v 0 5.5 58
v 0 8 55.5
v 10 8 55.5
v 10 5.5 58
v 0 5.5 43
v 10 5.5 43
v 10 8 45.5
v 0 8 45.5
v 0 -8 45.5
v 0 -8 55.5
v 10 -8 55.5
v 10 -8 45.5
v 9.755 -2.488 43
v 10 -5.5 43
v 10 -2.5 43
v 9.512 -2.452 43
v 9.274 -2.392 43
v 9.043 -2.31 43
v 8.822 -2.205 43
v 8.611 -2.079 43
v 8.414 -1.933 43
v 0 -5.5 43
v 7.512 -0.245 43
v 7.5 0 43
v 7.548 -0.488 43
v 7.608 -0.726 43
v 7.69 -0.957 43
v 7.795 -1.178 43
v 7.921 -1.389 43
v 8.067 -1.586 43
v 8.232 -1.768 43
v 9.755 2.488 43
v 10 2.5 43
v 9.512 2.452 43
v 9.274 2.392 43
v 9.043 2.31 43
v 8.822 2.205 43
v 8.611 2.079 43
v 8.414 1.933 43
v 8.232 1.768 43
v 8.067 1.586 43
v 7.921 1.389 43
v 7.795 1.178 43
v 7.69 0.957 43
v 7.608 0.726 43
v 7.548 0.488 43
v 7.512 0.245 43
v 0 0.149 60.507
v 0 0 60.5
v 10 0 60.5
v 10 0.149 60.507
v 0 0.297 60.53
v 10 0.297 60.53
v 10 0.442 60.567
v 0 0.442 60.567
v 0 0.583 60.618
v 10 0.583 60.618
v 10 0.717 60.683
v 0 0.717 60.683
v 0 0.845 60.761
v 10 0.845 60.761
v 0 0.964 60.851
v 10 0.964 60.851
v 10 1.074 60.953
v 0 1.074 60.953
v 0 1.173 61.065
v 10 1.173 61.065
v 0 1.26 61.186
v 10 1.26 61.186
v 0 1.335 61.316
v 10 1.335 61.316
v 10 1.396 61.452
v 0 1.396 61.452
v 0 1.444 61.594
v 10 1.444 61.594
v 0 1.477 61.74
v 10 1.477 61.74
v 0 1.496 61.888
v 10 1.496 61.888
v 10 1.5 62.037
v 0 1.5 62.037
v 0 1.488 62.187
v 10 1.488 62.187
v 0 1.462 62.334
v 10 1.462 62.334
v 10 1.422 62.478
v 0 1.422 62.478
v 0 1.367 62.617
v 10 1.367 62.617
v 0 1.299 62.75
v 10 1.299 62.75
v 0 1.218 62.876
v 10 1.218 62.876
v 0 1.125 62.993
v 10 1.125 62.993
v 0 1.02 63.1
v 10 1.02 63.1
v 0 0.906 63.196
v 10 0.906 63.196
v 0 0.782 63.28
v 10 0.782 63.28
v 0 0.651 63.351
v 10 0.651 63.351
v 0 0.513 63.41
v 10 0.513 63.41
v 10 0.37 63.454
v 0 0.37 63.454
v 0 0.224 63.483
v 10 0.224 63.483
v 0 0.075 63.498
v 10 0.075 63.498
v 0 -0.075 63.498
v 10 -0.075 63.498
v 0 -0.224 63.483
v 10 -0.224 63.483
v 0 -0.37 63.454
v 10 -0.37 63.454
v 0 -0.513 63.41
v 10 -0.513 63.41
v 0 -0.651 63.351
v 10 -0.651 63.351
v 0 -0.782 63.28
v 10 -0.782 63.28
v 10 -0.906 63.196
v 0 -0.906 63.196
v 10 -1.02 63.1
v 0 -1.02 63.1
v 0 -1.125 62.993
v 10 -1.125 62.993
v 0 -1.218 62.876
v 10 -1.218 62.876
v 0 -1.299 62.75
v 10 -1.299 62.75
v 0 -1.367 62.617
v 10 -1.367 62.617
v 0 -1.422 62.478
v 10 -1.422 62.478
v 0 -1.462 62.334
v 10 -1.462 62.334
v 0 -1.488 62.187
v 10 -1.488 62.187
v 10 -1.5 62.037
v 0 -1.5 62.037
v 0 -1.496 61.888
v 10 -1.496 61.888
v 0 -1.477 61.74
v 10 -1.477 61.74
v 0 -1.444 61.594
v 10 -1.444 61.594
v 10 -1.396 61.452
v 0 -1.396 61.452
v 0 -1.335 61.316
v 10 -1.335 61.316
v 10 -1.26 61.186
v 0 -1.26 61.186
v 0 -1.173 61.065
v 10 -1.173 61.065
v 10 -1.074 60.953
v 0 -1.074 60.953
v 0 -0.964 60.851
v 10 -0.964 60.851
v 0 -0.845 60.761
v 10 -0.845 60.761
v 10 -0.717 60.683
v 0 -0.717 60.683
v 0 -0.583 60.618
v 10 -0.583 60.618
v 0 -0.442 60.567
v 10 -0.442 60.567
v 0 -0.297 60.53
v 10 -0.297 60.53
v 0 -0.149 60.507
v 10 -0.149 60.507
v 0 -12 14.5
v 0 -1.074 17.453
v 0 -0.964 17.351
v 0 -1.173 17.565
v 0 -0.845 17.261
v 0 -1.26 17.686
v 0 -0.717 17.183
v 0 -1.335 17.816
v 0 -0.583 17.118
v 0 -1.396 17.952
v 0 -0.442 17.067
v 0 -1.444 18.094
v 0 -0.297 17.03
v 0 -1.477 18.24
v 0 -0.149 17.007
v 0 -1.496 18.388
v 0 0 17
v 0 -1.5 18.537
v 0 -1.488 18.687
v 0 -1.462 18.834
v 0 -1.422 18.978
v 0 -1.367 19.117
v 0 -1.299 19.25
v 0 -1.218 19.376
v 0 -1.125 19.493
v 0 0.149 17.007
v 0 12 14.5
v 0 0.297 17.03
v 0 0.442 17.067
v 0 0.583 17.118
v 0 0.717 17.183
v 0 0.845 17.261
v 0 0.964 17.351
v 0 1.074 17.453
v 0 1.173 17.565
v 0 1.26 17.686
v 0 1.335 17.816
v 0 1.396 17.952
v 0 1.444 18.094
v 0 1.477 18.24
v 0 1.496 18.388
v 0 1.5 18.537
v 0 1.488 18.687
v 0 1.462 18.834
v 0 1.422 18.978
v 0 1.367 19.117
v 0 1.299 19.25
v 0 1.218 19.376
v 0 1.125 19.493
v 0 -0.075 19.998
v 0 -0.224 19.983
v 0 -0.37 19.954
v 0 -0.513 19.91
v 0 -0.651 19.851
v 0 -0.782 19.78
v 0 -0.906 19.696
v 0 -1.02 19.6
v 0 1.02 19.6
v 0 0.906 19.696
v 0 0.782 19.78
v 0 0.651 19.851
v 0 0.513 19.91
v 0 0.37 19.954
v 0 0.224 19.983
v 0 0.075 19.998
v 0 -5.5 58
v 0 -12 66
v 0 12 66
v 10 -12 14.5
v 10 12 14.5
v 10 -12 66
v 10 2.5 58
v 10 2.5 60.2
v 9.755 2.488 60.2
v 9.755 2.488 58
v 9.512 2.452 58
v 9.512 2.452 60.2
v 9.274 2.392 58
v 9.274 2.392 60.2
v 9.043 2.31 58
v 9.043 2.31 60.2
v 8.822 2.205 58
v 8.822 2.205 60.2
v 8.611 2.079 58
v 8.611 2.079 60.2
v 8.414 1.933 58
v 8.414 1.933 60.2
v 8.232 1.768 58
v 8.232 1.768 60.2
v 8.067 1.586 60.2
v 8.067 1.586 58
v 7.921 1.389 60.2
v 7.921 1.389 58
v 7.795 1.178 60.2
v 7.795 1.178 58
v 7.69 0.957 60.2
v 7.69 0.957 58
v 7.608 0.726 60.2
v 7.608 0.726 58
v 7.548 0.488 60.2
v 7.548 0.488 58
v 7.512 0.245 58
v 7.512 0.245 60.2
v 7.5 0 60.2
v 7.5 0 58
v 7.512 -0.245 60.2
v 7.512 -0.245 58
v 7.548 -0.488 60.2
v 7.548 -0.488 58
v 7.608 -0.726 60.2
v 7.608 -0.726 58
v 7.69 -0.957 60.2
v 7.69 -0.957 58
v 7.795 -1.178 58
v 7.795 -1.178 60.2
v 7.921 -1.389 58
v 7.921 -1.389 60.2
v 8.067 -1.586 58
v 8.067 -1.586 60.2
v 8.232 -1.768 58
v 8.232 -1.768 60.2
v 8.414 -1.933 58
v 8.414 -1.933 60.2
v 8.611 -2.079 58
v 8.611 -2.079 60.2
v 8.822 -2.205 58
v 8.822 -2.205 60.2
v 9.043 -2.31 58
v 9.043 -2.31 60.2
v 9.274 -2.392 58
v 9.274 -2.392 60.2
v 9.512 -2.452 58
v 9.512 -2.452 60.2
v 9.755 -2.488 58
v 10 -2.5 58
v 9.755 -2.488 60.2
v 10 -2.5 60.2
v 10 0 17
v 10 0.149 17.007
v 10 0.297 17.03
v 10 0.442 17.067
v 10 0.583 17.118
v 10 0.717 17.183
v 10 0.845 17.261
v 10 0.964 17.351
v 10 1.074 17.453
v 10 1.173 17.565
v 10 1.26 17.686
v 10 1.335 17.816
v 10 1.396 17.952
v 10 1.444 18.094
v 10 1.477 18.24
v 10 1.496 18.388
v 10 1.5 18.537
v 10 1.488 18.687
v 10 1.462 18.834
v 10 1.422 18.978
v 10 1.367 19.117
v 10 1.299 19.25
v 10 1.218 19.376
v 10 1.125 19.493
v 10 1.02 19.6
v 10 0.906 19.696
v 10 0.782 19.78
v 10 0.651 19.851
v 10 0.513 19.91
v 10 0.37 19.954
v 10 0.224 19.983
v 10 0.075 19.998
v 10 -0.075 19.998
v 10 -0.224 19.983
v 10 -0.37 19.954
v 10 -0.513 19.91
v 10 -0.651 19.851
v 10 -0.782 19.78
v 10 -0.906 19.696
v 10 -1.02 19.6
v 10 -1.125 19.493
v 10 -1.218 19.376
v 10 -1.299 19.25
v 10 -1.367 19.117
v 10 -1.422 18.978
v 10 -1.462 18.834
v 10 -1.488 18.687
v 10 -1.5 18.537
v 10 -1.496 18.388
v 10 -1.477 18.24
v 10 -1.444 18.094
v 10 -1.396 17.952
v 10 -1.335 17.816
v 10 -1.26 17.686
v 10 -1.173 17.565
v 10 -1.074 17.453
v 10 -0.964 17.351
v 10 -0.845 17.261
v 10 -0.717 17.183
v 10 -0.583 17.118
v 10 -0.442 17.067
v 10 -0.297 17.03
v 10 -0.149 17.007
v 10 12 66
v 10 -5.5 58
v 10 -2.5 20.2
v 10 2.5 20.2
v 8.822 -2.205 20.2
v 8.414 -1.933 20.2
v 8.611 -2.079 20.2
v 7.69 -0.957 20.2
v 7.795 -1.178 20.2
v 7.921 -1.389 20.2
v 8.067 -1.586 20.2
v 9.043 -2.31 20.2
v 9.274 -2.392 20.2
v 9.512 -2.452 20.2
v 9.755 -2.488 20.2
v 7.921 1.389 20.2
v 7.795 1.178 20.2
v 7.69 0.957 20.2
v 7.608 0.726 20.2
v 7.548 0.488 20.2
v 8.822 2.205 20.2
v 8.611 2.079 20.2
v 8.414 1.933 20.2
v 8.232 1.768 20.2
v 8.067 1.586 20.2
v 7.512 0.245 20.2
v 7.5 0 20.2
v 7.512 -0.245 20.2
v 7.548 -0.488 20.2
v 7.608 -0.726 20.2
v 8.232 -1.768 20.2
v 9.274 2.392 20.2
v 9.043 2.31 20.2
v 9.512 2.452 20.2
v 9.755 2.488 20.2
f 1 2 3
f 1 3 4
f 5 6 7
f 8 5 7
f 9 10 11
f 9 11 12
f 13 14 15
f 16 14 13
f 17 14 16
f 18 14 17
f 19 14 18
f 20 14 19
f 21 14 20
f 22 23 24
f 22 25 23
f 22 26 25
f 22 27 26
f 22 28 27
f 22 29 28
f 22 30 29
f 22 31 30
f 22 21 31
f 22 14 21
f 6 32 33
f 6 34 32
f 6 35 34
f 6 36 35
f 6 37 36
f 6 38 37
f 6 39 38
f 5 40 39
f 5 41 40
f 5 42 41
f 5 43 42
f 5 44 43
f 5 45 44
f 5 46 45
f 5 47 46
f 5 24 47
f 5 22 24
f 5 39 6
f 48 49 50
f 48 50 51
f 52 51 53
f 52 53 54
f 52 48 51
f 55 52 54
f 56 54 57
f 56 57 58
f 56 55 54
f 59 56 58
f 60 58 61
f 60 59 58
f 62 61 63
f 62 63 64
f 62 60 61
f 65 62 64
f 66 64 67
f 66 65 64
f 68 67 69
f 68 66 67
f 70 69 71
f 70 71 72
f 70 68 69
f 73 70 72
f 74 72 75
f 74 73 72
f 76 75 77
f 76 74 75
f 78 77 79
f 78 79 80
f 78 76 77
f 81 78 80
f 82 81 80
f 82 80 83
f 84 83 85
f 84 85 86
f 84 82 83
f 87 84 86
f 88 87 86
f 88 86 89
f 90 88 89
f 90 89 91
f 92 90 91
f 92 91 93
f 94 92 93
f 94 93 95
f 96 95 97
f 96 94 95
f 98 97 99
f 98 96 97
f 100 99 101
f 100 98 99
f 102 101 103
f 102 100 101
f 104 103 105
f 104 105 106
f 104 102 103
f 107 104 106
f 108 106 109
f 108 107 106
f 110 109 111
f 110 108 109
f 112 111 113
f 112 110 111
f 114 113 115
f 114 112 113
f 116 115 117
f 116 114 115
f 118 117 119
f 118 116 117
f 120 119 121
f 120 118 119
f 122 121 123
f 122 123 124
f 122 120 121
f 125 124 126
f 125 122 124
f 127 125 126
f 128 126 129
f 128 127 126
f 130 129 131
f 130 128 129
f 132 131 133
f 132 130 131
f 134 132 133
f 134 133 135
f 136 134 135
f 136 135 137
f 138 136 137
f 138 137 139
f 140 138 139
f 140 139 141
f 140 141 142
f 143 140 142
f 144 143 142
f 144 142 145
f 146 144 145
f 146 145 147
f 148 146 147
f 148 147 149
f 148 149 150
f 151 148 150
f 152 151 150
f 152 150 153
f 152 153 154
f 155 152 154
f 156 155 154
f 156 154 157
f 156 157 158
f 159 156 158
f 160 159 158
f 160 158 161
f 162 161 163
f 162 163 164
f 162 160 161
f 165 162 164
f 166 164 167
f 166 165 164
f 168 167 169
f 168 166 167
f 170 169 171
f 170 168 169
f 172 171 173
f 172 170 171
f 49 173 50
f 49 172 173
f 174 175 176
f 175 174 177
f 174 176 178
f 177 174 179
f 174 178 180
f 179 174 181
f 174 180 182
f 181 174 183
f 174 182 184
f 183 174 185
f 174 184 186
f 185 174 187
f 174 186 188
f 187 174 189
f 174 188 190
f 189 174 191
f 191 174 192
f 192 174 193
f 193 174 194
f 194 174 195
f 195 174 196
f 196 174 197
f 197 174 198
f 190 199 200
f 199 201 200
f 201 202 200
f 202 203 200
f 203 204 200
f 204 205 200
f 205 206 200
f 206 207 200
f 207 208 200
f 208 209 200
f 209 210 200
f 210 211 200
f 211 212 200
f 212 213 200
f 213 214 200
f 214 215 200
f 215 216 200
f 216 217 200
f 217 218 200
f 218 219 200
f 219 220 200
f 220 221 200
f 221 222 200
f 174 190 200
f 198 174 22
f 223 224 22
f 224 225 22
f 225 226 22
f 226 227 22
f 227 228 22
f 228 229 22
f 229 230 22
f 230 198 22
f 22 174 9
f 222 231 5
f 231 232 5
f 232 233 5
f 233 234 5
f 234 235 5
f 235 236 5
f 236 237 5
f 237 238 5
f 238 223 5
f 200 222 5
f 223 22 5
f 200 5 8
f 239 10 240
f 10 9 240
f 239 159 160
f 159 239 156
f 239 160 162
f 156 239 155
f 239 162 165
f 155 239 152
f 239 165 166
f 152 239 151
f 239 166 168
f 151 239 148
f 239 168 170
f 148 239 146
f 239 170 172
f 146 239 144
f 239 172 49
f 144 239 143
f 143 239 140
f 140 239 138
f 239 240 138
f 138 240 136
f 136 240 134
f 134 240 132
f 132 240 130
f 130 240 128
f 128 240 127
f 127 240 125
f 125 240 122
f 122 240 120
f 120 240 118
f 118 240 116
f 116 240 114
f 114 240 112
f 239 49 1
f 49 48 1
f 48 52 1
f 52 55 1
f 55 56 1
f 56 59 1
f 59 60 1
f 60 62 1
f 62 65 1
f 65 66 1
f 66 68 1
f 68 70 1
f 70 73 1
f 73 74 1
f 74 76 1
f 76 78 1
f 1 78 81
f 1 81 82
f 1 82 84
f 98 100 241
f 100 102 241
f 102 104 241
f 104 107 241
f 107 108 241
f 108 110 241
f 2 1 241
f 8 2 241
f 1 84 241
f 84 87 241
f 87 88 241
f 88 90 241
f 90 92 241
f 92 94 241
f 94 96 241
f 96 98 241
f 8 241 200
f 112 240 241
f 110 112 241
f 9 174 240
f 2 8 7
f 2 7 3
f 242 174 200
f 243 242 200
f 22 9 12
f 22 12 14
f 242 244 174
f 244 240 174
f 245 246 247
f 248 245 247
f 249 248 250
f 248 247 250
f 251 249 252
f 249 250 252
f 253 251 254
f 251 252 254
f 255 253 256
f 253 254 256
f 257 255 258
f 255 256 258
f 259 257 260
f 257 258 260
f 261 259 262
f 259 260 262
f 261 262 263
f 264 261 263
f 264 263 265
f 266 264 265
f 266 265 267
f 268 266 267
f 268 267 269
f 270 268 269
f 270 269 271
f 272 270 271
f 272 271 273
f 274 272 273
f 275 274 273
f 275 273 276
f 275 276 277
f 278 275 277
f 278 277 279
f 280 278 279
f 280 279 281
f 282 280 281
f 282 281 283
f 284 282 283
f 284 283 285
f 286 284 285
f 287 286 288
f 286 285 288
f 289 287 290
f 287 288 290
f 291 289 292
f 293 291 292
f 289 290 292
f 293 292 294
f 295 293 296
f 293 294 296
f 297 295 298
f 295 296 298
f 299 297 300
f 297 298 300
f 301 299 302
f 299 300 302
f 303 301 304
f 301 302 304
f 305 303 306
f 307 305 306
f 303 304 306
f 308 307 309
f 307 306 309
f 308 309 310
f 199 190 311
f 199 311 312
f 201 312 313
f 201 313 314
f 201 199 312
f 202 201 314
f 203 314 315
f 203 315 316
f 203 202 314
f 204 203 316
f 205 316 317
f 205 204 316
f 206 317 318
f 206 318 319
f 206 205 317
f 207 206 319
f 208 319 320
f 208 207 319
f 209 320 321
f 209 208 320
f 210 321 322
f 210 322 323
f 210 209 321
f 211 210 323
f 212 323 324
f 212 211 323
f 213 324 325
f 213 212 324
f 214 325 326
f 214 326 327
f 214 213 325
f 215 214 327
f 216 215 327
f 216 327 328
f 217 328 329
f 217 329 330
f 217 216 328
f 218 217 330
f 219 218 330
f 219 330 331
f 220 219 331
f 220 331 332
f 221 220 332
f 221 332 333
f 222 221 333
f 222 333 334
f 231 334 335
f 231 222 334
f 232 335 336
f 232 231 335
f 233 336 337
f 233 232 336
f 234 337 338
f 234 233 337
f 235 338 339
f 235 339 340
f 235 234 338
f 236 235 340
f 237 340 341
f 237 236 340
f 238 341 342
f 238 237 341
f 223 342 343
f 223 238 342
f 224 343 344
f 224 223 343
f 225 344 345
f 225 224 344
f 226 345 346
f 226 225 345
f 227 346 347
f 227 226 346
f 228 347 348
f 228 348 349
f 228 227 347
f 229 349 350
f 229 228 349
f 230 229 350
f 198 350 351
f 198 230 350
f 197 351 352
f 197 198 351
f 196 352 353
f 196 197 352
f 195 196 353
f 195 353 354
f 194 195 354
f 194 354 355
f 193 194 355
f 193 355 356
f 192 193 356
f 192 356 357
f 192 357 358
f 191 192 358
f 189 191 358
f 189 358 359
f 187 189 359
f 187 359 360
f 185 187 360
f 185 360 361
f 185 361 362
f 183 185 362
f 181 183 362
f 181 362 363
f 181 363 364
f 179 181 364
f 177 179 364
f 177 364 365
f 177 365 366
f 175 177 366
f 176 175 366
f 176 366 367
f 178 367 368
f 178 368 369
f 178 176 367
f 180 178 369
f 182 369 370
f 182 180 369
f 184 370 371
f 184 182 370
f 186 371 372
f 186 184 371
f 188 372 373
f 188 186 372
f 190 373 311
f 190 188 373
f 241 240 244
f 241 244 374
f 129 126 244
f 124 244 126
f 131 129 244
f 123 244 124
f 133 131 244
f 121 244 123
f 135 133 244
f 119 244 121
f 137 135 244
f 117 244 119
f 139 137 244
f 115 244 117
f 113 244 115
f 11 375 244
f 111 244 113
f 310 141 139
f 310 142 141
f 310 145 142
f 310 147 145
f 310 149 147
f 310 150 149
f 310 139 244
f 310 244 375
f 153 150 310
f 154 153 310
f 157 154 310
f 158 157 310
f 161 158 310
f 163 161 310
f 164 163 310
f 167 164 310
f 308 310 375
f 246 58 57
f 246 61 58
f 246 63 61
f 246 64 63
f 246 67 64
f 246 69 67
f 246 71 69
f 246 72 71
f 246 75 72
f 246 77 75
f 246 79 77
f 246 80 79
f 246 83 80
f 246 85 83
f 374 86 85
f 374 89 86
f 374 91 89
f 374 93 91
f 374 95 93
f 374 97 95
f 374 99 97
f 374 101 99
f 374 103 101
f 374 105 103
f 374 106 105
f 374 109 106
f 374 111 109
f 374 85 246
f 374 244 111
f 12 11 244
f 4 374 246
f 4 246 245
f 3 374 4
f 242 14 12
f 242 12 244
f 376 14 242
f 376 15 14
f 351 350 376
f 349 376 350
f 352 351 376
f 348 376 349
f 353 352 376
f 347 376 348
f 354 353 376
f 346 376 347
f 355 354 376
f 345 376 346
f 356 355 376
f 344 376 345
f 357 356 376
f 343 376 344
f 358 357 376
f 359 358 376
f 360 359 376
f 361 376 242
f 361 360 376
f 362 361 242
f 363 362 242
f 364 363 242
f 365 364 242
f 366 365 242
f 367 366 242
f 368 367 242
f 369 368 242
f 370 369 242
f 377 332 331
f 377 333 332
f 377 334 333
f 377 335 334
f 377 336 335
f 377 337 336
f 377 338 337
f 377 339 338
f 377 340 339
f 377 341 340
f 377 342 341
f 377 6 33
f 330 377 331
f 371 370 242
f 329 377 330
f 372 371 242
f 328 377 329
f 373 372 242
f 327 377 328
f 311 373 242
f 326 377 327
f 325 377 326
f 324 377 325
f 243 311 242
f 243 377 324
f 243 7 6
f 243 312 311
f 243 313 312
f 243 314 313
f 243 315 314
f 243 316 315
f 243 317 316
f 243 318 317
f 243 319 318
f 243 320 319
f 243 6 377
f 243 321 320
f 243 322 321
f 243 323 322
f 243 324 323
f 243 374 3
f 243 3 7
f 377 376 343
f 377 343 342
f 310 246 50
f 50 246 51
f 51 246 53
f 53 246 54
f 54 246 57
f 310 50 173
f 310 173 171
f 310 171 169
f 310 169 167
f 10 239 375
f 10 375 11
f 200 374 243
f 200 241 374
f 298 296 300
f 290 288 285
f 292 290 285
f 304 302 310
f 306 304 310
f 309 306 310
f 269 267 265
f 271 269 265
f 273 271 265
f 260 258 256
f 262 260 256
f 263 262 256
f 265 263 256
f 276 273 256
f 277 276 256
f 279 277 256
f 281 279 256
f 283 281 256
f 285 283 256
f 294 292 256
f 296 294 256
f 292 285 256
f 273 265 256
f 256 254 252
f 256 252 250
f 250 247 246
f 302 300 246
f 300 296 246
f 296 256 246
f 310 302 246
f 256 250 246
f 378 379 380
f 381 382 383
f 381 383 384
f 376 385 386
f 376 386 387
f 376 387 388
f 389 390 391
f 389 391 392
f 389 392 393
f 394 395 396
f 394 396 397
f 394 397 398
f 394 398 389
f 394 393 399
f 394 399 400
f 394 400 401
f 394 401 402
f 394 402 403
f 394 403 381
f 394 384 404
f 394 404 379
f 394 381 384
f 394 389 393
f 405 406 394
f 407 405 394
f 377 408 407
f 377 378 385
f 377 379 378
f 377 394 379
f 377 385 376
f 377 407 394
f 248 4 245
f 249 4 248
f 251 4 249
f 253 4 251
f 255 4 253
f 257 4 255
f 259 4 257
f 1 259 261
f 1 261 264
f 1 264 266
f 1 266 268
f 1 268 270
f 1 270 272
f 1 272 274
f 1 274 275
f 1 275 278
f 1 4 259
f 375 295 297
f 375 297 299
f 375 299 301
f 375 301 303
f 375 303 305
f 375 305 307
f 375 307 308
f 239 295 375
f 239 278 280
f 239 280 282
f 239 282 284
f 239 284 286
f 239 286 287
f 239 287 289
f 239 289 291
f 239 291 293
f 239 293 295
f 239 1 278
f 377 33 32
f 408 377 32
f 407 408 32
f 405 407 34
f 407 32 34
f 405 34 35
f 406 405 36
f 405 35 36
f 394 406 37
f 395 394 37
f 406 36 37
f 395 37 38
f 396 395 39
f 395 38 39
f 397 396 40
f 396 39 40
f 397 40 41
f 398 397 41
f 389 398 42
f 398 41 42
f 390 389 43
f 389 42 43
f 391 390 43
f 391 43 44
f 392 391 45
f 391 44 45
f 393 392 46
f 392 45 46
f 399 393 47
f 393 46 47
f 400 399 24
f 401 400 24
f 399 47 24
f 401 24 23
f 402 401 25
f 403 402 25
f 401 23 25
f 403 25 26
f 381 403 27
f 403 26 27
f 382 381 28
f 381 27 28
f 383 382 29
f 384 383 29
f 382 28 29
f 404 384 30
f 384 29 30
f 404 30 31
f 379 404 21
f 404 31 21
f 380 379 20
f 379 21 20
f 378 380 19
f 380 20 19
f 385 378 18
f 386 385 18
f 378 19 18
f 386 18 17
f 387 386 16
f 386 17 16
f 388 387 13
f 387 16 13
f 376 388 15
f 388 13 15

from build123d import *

# Parameters (mm, degrees)
SKETCH_1_W          = 42
SKETCH_1_H          = 42
EXTRUDE_1_DEPTH     = 40
CHAMFER_1_SIZE      = 5
SKETCH_4_R          = 1.75
CUT_EXTRUDE_1_DEPTH = 3
SKETCH_5_W          = 26
SKETCH_5_H          = 24
SKETCH_5_W_2        = 15
SKETCH_5_H_2        = 16
EXTRUDE_2_DEPTH     = 21
SKETCH_7_W          = 40
SKETCH_7_H          = 24
CUT_EXTRUDE_3_DEPTH = 21
SKETCH_6_R          = 3
CUT_EXTRUDE_2_DEPTH = 10
CHAMFER_2_SIZE      = 2.5
SKETCH_8_W          = 51.5
SKETCH_8_H          = 24
SKETCH_8_R          = 1.5
EXTRUDE_3_DEPTH     = 10
CUT_EXTRUDE_5_DEPTH = 73.374028491
CUT_EXTRUDE_START   = -5.8
SKETCH_10_R         = 2.5
CUT_EXTRUDE_6_DEPTH = 40


with BuildPart() as part:
    # 草圖1 → 填料-伸長1 (new body)
    with BuildSketch(Plane.XY):
        Rectangle(SKETCH_1_W, SKETCH_1_H)
    extrude(amount=EXTRUDE_1_DEPTH)

    # 導角1
    chamfer_1_edges = [part.edges().sort_by_distance(p)[0] for p in [
        (-21, 21, 20),
        (21, 21, 20),
        (21, -21, 20),
        (-21, -21, 20),
    ]]
    chamfer(chamfer_1_edges, length=CHAMFER_1_SIZE)

    # 草圖4 → 除料-伸長1 (cut)
    with BuildSketch(Plane.XY.offset(40)):
        with Locations((-15.5, 15.5)):
            Circle(SKETCH_4_R)
        with Locations(Location((-15.5, -15.5, 0), (0, 0, 180))):
            Circle(SKETCH_4_R)
        with Locations((15.5, -15.5)):
            Circle(SKETCH_4_R)
        with Locations(Location((15.5, 15.5, 0), (0, 0, 180))):
            Circle(SKETCH_4_R)
    extrude(amount=-CUT_EXTRUDE_1_DEPTH, mode=Mode.SUBTRACT)

    # 草圖7 → 除料-伸長3 (cut)
    with BuildSketch(Plane(origin=(21, 0, 0), x_dir=(0, 0, -1), z_dir=(1, 0, 0))):
        with Locations((-20, 0)):
            Rectangle(SKETCH_7_W, SKETCH_7_H)
    extrude(amount=-CUT_EXTRUDE_3_DEPTH, mode=Mode.SUBTRACT)


with BuildPart() as body_2:
    # 草圖5 → 填料-伸長2 (new body)
    with BuildSketch(Plane.ZY.offset(21)):
        with Locations((53, 0)):
            Rectangle(SKETCH_5_W, SKETCH_5_H)
        with Locations((50.5, 0)):
            Rectangle(SKETCH_5_W_2, SKETCH_5_H_2, mode=Mode.SUBTRACT)
    extrude(amount=-EXTRUDE_2_DEPTH)


with BuildPart() as cut_extrude_2_tool:
    # 草圖6 → 除料-伸長2 (new body)
    with BuildSketch(Plane(origin=(0, 0, 0), x_dir=(0, 0, -1), z_dir=(1, 0, 0))):
        with Locations((-62, 0)):
            Circle(SKETCH_6_R)
        with Locations((-18.5, 0)):
            Circle(SKETCH_6_R)
    extrude(amount=-CUT_EXTRUDE_2_DEPTH)


with BuildPart() as part_1:
    add(part.part)

    # 除料-伸長2: cut by cut_extrude_2_tool
    add(cut_extrude_2_tool.part, mode=Mode.SUBTRACT)



with BuildPart() as body_2_1:
    add(body_2.part)

    # 除料-伸長2: cut by cut_extrude_2_tool
    add(cut_extrude_2_tool.part, mode=Mode.SUBTRACT)

    # 導角2
    chamfer_2_edges = [body_2_1.edges().sort_by_distance(p)[0] for p in [
        (-10.5, -8, 43),
        (-10.5, 8, 43),
        (-10.5, 8, 58),
        (-10.5, -8, 58),
    ]]
    chamfer(chamfer_2_edges, length=CHAMFER_2_SIZE)


with BuildPart() as part_2:
    add(part_1.part)

    add(body_2_1.part)  # 填料-伸長3 merges body 2
    # 草圖8 → 填料-伸長3 (add)
    with BuildSketch(Plane(origin=(0, 0, 0), x_dir=(0, 0, -1), z_dir=(1, 0, 0))):
        with Locations((-40.25, 0)):
            Rectangle(SKETCH_8_W, SKETCH_8_H)
        with Locations((-62, 0)):
            Circle(SKETCH_8_R, mode=Mode.SUBTRACT)
        with Locations((-18.5, 0)):
            Circle(SKETCH_8_R, mode=Mode.SUBTRACT)
        Polygon((-58, 5.5), (-58, -5.5), (-55.5, -8), (-45.5, -8), (-43, -5.5), (-43, 5.5), (-45.5, 8), (-55.5, 8), align=None, mode=Mode.SUBTRACT)
    extrude(amount=EXTRUDE_3_DEPTH)

    # 草圖9 → 除料-伸長5 (cut, through all)
    with BuildSketch(Plane.XY.offset(66)):
        Polygon((21, 12), (21, 16), (16, 21), (-16, 21), (-21, 16), (-21, -16), (-16, -21), (16, -21), (21, -16), (21, -12), (0, -12), (0, 12), align=None)
    extrude(amount=-CUT_EXTRUDE_5_DEPTH, mode=Mode.SUBTRACT)

    # 草圖10 → 除料-伸長6 (cut)
    with BuildSketch(Plane.XY.offset(66).offset(CUT_EXTRUDE_START)):
        with Locations((10, 0)):
            Circle(SKETCH_10_R)
    extrude(amount=-CUT_EXTRUDE_6_DEPTH, mode=Mode.SUBTRACT)


solid = part_2.part
